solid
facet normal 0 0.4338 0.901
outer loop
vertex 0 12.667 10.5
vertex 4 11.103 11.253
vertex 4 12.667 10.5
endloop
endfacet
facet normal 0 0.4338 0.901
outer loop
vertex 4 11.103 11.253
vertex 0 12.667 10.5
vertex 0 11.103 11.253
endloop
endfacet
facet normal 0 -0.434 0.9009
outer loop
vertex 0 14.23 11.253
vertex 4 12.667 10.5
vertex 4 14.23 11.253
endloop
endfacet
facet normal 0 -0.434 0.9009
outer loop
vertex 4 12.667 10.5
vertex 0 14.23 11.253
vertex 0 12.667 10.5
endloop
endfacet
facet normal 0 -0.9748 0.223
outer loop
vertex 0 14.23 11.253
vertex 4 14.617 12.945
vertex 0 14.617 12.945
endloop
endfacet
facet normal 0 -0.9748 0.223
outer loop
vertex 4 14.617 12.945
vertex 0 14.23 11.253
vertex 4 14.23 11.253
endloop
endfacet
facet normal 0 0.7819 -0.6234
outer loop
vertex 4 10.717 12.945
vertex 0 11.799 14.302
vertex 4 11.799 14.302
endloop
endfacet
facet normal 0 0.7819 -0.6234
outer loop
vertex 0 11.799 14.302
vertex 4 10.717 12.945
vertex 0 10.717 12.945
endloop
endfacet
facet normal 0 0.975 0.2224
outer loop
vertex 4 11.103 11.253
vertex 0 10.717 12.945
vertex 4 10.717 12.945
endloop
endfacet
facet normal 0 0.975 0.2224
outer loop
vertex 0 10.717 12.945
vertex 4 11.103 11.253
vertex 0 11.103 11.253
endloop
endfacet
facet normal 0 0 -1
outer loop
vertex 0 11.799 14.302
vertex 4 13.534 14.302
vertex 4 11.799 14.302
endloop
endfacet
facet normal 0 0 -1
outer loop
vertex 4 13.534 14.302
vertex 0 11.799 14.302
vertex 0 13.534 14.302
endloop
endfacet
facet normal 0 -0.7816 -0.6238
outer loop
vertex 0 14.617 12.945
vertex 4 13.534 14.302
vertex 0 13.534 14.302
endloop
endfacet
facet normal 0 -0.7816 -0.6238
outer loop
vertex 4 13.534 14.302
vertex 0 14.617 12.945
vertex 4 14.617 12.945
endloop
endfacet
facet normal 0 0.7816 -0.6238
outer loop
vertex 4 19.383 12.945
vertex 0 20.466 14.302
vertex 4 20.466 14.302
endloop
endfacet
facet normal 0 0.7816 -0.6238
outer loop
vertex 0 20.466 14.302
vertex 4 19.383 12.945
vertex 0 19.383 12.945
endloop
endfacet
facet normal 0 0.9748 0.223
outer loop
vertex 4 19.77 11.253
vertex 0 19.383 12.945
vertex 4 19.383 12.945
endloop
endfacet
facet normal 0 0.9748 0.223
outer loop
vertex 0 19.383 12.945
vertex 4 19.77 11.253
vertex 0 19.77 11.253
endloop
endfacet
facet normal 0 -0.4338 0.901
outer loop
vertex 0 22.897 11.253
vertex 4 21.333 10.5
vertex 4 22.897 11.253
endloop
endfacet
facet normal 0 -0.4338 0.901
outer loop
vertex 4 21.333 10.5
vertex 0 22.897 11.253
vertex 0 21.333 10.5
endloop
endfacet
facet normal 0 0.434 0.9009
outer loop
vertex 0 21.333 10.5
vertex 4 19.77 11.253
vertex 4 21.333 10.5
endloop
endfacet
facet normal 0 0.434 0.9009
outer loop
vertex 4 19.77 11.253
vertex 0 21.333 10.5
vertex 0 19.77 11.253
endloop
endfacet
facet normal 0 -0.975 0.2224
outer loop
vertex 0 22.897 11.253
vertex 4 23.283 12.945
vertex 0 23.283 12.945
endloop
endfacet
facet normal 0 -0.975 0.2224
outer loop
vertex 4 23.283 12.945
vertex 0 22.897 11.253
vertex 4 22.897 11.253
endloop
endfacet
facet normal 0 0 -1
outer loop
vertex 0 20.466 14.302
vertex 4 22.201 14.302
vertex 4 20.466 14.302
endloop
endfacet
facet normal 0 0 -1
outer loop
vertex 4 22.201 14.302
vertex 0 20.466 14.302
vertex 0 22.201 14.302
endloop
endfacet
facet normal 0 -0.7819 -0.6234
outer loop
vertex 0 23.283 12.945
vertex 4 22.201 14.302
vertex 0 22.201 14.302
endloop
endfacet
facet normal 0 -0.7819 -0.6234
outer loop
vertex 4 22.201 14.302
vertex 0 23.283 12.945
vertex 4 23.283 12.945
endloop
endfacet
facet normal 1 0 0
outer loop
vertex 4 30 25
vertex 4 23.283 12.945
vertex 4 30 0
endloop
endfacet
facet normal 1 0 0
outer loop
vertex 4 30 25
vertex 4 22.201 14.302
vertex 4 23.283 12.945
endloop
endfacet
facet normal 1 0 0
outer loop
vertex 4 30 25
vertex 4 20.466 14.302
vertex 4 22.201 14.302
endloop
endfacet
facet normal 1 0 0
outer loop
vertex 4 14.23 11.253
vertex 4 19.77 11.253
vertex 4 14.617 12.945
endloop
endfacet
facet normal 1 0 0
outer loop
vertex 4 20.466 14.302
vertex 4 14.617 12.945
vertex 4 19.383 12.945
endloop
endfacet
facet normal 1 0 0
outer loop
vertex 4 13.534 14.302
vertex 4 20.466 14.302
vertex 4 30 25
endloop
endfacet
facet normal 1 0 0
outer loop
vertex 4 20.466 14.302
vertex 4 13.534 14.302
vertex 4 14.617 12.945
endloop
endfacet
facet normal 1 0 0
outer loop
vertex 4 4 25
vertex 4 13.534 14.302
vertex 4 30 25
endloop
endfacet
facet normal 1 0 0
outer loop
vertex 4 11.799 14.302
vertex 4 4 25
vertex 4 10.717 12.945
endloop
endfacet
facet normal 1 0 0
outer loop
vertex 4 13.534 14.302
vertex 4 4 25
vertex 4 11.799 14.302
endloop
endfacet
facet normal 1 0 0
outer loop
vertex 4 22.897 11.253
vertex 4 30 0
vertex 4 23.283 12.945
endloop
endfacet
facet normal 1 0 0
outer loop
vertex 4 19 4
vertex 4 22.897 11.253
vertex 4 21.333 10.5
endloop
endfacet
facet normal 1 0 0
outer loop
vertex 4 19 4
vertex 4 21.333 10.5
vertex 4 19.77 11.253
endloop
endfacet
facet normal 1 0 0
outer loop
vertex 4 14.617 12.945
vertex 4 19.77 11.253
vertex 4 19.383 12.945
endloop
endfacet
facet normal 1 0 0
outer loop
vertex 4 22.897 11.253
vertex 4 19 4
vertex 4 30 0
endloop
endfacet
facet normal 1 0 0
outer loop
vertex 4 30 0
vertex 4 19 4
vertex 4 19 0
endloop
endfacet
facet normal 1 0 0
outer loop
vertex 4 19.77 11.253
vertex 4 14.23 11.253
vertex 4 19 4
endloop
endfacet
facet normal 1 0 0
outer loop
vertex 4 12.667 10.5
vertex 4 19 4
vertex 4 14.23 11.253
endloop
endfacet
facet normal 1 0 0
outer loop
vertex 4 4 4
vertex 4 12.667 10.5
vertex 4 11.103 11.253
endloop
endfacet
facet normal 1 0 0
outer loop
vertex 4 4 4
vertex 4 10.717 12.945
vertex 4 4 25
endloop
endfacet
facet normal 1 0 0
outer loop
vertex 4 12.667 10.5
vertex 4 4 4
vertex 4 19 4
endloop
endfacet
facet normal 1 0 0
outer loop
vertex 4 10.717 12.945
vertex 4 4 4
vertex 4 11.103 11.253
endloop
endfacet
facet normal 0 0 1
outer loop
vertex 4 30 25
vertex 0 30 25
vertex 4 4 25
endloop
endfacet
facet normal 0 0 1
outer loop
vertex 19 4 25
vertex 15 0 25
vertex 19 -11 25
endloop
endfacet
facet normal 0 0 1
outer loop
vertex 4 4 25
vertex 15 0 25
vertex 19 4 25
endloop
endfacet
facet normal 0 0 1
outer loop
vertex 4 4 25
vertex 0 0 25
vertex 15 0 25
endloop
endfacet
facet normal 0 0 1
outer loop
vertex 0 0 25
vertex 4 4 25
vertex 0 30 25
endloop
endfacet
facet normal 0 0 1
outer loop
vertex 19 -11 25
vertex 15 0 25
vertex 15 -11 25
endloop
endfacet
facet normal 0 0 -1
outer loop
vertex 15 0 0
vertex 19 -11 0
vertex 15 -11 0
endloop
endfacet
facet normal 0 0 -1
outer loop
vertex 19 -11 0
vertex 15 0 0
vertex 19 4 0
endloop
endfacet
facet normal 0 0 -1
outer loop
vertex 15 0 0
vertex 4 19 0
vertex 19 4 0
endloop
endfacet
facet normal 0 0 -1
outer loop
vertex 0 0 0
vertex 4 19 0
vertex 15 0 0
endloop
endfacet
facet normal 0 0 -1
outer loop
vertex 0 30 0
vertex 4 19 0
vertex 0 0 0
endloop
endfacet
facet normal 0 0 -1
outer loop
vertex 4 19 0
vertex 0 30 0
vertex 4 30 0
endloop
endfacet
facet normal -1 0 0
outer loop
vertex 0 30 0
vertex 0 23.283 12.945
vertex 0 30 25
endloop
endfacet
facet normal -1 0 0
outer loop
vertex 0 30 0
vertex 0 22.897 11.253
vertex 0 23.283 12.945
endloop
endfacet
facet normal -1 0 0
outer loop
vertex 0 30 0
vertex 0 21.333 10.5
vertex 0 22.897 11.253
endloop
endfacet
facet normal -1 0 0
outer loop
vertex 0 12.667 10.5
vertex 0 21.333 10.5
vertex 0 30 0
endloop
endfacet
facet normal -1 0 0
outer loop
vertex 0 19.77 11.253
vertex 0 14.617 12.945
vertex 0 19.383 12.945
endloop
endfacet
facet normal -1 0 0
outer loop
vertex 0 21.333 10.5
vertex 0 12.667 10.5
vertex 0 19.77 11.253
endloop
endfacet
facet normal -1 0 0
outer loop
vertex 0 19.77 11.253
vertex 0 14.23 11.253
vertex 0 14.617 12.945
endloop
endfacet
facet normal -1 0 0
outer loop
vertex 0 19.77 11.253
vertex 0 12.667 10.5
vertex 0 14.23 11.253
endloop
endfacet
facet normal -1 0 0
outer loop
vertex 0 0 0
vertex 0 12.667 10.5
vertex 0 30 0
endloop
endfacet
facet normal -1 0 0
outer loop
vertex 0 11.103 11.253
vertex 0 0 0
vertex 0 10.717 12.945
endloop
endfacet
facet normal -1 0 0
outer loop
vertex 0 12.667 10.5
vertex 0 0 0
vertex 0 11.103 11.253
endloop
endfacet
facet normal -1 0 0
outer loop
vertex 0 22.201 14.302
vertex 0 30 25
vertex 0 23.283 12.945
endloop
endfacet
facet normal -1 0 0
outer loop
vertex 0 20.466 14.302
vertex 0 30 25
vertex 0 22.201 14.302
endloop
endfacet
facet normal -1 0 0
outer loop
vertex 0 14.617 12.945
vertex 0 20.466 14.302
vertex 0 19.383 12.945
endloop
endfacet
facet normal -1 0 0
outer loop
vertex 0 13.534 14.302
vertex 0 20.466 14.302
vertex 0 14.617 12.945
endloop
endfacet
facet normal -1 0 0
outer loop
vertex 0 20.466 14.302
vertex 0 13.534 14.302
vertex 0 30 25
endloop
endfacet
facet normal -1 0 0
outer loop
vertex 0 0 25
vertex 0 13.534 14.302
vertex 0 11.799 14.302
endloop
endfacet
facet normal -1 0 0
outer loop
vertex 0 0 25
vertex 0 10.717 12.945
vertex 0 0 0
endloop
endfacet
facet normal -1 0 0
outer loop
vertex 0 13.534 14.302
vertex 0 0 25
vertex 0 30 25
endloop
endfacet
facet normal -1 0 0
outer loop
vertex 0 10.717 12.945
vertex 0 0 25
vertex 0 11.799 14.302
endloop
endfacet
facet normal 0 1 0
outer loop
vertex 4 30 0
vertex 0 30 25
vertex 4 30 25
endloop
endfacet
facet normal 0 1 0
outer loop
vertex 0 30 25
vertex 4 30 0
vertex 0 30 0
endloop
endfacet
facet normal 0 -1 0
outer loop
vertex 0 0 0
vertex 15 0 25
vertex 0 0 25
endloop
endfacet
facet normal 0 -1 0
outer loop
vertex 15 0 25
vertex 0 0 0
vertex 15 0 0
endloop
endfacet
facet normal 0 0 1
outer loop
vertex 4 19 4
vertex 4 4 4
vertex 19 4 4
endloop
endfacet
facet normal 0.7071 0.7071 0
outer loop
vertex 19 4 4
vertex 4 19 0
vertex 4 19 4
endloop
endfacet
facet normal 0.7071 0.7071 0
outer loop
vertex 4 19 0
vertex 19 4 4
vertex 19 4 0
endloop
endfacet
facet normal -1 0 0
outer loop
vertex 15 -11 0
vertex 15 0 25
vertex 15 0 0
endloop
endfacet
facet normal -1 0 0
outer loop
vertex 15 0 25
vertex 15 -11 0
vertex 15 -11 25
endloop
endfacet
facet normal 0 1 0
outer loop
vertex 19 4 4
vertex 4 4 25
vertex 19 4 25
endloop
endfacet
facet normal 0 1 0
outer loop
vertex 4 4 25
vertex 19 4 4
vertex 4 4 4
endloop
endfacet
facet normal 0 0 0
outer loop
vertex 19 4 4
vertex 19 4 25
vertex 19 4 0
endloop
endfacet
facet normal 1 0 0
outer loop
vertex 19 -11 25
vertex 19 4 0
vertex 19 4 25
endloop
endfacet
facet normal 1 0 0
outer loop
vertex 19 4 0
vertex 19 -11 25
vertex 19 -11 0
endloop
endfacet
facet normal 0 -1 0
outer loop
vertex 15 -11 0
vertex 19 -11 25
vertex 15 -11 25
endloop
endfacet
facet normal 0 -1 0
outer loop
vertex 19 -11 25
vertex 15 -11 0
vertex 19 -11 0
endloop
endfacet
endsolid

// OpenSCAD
// preview[view:north east, tilt:top diagonal]
$fs = 2*1;
$fa = 2*1;

//how wide should the part be?
wall_width = 25; //[15:50]

//how thick (strong) should the walls be?
wall_depth = 4; //[4:10]

//how far from the attached surface should the lip be?
hook_depth = 15; //[10:30]

//how high should the lip go?
hook_lip = 15; //[10:30]

//how tall should the attaching part be?
anchor_height = 30; //[30:100]

//diameter of screw hole
screw_diameter = 4; //[4:10]
screw_r = screw_diameter / 2;

//what is the additional width of the widest part of the flange
screw_flange = 0; //[0:5]

sqrt2 = sqrt(2);

cube([hook_depth, wall_depth, wall_width]);
translate([hook_depth, wall_depth-hook_lip, 0])
	cube([wall_depth, hook_lip, wall_width]);
difference() {
	cube([wall_depth, anchor_height, wall_width]);
	
	for(y=[1:2]) {
		translate([-1, wall_depth + (y * (anchor_height - wall_depth) / 3), wall_width / 2])
		rotate([0, 90, 0])
			screw_hole();
	}
}
intersection() {
	cube([hook_depth + wall_depth, hook_depth + wall_depth, wall_depth]);
	rotate([0, 0, 45])
		translate([-sqrt2 * hook_depth / 2, -sqrt2 * hook_depth / 2, 0])
			cube([sqrt2 * (hook_depth + wall_depth), sqrt2 * (hook_depth + wall_depth), wall_depth]);
}

module screw_hole() {
	cylinder(r1=screw_r, r2 = screw_r + screw_flange/2, h=wall_depth + 2);
}
